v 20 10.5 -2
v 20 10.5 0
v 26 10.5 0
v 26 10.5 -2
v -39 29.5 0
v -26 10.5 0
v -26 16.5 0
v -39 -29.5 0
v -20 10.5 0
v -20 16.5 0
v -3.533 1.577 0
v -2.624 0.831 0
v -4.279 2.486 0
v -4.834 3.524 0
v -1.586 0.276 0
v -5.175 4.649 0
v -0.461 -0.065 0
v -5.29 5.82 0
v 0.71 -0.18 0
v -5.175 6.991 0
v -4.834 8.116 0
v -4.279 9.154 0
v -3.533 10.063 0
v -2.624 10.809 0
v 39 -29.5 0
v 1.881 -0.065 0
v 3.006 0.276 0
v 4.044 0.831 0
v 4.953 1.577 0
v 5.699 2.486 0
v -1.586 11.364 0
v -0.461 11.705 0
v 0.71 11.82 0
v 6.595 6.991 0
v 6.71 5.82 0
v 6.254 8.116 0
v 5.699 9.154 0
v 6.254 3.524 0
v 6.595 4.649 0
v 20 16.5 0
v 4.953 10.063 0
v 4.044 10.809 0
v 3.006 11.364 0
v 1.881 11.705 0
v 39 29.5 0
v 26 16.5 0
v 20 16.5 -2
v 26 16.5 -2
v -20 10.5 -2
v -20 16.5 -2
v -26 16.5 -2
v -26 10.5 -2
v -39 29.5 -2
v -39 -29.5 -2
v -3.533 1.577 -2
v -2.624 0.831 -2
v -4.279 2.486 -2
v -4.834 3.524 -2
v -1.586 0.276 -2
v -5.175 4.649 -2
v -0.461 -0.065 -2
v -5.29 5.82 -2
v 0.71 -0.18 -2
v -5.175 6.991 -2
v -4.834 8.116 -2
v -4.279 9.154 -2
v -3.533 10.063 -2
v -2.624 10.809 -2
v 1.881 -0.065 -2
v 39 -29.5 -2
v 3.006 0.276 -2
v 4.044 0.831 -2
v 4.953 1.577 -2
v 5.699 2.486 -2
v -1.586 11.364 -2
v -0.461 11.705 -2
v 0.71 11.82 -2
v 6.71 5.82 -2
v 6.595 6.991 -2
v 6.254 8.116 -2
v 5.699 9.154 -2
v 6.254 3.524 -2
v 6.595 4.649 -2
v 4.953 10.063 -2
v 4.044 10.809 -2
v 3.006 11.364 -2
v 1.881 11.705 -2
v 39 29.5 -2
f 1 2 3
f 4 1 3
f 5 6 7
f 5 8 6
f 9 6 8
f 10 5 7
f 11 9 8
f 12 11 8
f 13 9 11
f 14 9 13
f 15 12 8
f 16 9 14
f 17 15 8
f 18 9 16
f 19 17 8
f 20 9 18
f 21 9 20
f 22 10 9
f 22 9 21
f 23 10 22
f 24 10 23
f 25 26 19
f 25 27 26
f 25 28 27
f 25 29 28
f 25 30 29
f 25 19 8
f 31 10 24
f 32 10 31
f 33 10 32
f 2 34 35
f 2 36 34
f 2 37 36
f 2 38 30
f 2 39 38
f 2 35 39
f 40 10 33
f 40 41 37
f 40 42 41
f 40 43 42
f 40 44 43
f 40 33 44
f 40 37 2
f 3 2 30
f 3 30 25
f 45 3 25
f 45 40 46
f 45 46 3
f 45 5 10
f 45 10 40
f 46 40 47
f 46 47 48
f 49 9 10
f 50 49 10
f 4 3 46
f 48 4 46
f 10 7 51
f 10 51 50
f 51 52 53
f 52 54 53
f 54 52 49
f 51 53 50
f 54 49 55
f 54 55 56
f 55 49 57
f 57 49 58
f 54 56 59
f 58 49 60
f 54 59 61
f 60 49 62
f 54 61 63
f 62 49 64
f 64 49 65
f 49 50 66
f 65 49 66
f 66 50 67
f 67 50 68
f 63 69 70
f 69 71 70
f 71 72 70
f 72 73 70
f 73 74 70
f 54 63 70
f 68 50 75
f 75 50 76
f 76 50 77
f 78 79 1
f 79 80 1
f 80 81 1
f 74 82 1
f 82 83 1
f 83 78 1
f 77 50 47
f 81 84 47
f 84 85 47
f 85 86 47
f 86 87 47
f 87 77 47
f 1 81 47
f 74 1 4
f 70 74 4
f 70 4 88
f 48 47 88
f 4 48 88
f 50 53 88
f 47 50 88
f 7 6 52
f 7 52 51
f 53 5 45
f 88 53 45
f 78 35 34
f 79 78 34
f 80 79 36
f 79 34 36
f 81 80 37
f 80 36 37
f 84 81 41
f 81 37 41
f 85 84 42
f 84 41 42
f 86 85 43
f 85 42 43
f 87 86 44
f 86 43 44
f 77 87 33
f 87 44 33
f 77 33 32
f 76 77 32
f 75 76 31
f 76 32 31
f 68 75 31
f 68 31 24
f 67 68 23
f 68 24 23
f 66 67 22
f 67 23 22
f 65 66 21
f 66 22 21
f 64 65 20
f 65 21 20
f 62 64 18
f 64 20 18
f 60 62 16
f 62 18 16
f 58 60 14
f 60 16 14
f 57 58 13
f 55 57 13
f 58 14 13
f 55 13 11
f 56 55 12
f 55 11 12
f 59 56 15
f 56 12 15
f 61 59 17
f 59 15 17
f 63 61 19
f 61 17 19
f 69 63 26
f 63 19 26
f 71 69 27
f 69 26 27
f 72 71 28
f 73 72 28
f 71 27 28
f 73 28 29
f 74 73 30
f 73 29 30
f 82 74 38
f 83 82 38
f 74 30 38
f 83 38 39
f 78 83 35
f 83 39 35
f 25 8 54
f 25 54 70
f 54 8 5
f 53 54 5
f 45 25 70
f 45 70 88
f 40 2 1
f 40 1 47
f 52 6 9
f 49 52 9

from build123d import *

# Parameters (mm, degrees)
SKETCH1_W           = 78
SKETCH1_H           = 59
SKETCH1_R           = 6.000383827
SKETCH1_W_2         = 6
SKETCH1_H_2         = 6
BOSS_EXTRUDE1_DEPTH = 2


with BuildPart() as part:
    # Sketch1 → Boss-Extrude1 (new body)
    with BuildSketch(Plane.XY):
        Rectangle(SKETCH1_W, SKETCH1_H)
        with Locations((0.71, 5.82)):
            Circle(SKETCH1_R, mode=Mode.SUBTRACT)
        with Locations((-23, 13.5)):
            Rectangle(SKETCH1_W_2, SKETCH1_H_2, mode=Mode.SUBTRACT)
        with Locations((23, 13.5)):
            Rectangle(SKETCH1_W_2, SKETCH1_H_2, mode=Mode.SUBTRACT)
    extrude(amount=-BOSS_EXTRUDE1_DEPTH)


solid = part.part
